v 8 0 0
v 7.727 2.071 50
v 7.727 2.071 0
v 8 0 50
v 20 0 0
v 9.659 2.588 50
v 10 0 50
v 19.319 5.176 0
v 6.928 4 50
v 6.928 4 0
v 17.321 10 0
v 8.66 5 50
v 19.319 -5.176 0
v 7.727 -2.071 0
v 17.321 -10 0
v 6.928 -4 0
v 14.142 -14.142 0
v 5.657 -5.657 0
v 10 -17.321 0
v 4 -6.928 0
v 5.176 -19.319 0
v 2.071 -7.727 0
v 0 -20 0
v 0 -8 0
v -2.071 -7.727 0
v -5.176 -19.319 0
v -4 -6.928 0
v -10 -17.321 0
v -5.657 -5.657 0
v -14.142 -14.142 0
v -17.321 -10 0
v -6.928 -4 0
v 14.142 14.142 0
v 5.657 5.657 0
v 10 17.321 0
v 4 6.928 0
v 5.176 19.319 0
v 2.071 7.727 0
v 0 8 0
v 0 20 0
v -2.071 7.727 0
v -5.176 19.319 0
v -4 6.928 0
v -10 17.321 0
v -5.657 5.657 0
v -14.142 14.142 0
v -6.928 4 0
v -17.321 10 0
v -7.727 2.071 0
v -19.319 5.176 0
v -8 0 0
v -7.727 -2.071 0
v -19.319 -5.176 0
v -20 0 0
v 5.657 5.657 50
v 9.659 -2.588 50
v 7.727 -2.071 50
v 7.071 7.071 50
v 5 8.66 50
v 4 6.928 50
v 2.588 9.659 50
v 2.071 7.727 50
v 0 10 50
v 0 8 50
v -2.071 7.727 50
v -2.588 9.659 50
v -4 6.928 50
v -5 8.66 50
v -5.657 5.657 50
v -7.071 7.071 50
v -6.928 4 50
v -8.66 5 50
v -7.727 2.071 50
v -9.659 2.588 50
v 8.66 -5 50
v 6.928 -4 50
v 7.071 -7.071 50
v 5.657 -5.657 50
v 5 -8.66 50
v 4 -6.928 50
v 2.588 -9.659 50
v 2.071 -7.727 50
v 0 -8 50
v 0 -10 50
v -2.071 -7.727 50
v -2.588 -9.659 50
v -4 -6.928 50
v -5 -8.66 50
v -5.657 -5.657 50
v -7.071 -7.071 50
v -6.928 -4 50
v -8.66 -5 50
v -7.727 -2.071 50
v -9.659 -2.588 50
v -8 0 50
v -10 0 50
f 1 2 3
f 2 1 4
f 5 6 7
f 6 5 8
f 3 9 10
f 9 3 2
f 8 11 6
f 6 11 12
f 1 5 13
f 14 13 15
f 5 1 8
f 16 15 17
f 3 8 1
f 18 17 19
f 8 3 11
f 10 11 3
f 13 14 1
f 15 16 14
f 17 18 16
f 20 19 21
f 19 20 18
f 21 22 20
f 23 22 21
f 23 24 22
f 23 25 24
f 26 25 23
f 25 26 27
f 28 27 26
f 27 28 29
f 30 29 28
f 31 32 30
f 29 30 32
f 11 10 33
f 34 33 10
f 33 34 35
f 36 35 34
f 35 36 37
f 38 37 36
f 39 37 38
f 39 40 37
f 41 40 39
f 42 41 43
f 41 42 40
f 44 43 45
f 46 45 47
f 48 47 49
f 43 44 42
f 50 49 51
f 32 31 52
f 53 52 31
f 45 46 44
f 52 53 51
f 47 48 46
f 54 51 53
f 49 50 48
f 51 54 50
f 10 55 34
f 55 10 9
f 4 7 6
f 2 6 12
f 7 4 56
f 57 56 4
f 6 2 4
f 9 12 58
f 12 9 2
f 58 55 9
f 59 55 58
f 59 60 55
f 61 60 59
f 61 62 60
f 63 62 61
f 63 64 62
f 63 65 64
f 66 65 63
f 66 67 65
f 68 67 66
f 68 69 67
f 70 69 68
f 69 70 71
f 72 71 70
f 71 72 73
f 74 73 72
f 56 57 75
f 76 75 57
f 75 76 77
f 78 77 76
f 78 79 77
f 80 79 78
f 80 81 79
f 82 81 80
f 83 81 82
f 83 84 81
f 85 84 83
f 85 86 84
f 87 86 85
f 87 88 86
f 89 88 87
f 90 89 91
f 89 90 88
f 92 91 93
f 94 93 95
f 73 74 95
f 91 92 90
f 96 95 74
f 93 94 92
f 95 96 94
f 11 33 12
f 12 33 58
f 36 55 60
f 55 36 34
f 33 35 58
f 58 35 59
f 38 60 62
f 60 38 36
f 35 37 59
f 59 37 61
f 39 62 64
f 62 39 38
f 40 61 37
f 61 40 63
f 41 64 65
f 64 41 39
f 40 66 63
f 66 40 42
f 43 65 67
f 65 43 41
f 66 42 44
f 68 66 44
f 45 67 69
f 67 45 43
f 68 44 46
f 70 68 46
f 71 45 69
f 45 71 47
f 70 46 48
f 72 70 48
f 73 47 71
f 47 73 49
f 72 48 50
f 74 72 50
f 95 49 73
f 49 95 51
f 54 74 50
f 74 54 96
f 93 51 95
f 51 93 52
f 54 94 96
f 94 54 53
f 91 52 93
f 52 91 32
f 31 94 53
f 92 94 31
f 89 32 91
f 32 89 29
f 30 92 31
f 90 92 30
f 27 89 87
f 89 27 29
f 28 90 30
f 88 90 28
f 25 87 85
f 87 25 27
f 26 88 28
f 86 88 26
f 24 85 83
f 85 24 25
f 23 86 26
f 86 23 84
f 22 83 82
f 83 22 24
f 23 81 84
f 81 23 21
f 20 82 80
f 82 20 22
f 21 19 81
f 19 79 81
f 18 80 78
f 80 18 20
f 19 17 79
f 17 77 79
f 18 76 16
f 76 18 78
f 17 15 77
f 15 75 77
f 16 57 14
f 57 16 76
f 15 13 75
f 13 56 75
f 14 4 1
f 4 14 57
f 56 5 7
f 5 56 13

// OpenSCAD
colors = ["red", "orange", "yellow", "green", "aqua","blue","purple", "violet"];
angle = 360/len(colors);

module segment(m) {
    rotate([0,0,m*angle])
    rotate_extrude(angle=angle) 
    polygon([
        [8,0],
        [8,50],
        [10,50],
        [20,0]
    ]);
}

material = 0;
if (material == 0) {
    for (m = [0:len(colors)-1]) {
        color(colors[m]) segment(m);
    }
} else if (material <= len(colors)) {
    segment(material-1);
}
